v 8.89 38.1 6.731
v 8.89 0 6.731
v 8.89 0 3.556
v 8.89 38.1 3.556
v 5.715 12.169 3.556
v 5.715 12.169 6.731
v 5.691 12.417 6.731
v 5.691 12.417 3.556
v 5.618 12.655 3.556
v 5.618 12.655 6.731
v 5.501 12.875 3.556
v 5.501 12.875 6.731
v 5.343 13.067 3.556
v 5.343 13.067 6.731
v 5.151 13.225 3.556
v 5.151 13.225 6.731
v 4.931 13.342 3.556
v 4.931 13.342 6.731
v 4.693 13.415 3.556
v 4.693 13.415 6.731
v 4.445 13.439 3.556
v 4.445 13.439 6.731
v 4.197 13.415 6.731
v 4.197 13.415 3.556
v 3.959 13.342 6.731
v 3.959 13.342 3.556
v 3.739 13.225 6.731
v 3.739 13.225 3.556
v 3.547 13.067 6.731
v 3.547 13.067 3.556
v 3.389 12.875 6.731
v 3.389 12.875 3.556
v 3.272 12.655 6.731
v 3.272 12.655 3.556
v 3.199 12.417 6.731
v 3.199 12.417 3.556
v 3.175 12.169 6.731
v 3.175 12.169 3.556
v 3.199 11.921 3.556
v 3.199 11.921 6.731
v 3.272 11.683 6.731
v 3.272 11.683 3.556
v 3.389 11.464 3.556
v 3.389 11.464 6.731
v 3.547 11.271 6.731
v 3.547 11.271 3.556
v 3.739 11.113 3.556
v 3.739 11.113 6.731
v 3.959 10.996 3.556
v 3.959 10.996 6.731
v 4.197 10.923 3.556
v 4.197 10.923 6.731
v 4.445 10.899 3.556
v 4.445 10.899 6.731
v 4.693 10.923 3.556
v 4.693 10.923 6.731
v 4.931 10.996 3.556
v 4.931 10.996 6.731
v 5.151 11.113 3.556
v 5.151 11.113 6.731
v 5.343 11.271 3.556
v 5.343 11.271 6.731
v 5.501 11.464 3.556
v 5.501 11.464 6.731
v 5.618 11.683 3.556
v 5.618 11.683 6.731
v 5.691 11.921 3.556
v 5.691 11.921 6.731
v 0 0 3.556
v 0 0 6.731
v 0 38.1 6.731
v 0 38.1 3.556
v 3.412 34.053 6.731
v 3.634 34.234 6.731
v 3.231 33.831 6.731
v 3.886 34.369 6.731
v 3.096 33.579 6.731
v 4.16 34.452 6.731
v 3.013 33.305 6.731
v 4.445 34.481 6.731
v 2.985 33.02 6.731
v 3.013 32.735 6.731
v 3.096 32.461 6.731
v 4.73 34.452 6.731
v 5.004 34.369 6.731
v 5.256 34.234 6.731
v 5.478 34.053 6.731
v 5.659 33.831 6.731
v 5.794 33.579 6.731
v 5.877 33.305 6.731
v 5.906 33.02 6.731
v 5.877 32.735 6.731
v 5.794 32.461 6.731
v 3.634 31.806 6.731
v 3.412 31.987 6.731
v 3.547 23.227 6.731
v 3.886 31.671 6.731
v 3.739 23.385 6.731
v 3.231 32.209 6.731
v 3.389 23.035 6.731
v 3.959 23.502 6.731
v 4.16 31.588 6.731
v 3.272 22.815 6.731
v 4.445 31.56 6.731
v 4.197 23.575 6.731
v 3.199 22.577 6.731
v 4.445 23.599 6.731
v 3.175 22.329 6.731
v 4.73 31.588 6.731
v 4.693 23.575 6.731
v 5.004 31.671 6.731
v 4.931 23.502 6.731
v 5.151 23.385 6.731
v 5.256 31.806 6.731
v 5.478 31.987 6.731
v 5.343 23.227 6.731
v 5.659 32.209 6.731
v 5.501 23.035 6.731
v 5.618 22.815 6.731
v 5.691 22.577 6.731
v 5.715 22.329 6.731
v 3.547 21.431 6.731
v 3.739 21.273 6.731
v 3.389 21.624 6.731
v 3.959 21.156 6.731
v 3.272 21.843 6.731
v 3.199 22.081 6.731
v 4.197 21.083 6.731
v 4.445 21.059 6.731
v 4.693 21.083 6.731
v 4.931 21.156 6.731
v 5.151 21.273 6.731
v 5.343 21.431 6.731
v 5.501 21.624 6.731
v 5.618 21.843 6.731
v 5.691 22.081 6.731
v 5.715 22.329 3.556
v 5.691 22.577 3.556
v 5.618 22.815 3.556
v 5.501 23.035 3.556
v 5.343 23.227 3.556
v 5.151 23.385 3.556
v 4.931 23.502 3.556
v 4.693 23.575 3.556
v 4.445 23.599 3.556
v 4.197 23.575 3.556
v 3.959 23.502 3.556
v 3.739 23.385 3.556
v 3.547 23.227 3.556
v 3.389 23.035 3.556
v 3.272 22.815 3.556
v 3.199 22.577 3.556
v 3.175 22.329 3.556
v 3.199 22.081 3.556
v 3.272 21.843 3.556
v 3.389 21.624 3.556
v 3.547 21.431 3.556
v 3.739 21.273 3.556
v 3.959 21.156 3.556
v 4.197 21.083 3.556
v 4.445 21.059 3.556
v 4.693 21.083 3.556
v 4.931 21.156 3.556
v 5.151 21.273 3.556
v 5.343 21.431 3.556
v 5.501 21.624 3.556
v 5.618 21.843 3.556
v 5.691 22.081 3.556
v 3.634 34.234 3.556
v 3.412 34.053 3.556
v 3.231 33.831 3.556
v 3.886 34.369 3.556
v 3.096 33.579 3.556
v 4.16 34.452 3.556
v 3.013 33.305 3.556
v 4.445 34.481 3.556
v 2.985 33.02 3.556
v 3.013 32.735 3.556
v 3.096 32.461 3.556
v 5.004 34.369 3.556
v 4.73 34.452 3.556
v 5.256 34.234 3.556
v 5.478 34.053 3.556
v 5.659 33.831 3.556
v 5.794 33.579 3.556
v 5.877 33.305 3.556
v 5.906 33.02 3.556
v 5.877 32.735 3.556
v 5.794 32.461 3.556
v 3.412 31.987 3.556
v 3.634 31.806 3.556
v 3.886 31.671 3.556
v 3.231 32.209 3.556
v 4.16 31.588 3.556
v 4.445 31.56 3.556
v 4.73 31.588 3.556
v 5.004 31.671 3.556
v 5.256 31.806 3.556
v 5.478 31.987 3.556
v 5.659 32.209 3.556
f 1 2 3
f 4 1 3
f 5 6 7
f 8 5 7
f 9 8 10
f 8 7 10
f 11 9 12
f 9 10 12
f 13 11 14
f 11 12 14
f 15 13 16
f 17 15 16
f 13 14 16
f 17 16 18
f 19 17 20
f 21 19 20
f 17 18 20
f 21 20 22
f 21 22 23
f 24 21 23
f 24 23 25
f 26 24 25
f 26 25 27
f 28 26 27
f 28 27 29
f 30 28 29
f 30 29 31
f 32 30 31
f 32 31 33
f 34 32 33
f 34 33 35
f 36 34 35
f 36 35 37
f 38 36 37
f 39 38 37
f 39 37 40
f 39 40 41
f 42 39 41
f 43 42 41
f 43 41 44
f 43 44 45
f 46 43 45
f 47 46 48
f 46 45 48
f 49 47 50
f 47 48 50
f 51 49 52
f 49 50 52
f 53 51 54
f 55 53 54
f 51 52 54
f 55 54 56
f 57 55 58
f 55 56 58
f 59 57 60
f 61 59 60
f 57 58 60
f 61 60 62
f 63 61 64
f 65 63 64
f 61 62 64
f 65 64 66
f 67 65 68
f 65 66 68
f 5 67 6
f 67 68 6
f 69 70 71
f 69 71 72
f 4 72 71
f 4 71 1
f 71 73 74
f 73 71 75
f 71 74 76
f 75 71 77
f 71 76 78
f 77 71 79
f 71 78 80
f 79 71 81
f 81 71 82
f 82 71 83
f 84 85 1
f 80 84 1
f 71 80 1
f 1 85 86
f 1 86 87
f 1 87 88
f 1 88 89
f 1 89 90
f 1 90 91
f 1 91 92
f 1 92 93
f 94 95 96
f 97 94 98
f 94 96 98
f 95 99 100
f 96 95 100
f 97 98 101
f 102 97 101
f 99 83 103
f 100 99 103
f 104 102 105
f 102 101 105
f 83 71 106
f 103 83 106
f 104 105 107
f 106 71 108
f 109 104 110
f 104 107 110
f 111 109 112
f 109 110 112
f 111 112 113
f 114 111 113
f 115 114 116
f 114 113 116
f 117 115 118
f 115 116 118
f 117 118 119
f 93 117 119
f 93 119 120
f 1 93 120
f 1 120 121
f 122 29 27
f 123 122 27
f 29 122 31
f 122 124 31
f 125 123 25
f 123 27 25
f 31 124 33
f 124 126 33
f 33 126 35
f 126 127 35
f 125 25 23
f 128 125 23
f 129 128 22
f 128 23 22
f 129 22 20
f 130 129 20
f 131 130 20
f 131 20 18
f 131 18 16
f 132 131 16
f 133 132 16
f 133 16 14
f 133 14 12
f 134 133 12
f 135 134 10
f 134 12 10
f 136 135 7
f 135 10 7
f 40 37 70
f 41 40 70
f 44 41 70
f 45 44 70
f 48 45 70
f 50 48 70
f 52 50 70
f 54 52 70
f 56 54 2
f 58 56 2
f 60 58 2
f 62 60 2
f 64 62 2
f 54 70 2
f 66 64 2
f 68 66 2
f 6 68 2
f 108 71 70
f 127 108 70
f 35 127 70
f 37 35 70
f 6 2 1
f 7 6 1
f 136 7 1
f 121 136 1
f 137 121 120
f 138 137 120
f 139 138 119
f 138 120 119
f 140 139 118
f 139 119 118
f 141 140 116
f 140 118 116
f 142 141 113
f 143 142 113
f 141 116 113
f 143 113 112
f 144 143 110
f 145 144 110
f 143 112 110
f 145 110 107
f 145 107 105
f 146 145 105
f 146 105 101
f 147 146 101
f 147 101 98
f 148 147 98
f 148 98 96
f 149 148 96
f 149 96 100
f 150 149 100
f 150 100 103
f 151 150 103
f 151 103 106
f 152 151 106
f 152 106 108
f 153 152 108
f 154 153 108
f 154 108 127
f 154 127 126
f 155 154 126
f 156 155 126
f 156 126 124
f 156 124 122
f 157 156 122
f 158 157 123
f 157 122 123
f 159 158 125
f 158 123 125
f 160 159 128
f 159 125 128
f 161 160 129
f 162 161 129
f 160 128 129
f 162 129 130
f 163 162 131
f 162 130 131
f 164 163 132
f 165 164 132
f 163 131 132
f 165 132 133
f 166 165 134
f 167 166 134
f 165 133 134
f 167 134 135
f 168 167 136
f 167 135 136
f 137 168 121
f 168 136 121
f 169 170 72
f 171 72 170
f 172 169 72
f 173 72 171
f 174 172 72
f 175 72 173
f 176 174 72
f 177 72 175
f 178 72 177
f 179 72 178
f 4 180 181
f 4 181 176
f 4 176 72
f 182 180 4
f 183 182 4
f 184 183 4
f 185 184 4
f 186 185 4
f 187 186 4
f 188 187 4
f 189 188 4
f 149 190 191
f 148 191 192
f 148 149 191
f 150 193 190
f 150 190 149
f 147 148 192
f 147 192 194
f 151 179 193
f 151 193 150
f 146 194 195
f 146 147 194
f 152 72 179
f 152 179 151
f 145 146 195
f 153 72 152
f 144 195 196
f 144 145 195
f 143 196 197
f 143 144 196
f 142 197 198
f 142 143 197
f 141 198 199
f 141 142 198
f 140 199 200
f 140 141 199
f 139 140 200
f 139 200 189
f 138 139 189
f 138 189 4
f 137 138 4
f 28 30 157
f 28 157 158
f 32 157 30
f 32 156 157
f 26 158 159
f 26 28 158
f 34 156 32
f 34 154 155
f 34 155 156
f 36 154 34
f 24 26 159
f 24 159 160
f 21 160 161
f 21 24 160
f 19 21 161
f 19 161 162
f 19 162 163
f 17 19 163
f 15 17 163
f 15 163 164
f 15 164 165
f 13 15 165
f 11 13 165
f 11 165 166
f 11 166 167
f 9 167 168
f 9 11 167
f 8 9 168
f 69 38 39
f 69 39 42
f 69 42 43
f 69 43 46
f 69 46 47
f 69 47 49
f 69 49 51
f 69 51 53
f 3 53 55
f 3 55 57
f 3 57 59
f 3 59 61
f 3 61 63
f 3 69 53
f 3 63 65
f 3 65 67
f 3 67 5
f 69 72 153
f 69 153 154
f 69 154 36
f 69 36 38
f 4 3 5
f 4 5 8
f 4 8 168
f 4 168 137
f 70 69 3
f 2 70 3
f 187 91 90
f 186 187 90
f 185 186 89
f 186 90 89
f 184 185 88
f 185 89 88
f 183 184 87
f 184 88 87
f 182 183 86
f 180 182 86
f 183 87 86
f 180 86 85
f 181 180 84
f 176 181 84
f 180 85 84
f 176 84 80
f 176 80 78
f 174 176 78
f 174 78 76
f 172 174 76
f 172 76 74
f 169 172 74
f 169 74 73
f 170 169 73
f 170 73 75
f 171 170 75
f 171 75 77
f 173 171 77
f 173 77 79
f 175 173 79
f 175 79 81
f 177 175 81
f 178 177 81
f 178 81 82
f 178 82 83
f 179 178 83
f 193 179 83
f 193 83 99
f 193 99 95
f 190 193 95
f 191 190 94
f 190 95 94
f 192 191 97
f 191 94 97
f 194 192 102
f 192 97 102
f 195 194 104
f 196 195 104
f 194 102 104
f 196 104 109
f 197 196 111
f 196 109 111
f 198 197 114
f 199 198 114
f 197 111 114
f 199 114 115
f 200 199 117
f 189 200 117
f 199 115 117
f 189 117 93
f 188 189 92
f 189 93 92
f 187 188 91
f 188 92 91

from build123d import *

# Parameters (mm, degrees)
SKETCH3_W           = 8.89
SKETCH3_H           = 3.175
BOSS_EXTRUDE2_DEPTH = 38.1
SKETCH4_R           = 1.4605
SKETCH4_R_2         = 1.27
CUT_EXTRUDE1_DEPTH  = 4.175


with BuildPart() as part:
    # Sketch3 → Boss-Extrude2 (new body)
    with BuildSketch(Plane(origin=(0, 0, 0), x_dir=(1, 0, 0), z_dir=(0, 1, 0))):
        with Locations((4.445, -5.1435)):
            Rectangle(SKETCH3_W, SKETCH3_H)
    extrude(amount=BOSS_EXTRUDE2_DEPTH)

    # Sketch4 → Cut-Extrude1 (cut, through all)
    with BuildSketch(Plane.XY.offset(6.731)):
        with Locations((4.445, 33.02)):
            Circle(SKETCH4_R)
        with Locations((4.445, 12.169083682)):
            Circle(SKETCH4_R_2)
        with Locations((4.445, 22.329083682)):
            Circle(SKETCH4_R_2)
    extrude(amount=-CUT_EXTRUDE1_DEPTH, mode=Mode.SUBTRACT)


solid = part.part
